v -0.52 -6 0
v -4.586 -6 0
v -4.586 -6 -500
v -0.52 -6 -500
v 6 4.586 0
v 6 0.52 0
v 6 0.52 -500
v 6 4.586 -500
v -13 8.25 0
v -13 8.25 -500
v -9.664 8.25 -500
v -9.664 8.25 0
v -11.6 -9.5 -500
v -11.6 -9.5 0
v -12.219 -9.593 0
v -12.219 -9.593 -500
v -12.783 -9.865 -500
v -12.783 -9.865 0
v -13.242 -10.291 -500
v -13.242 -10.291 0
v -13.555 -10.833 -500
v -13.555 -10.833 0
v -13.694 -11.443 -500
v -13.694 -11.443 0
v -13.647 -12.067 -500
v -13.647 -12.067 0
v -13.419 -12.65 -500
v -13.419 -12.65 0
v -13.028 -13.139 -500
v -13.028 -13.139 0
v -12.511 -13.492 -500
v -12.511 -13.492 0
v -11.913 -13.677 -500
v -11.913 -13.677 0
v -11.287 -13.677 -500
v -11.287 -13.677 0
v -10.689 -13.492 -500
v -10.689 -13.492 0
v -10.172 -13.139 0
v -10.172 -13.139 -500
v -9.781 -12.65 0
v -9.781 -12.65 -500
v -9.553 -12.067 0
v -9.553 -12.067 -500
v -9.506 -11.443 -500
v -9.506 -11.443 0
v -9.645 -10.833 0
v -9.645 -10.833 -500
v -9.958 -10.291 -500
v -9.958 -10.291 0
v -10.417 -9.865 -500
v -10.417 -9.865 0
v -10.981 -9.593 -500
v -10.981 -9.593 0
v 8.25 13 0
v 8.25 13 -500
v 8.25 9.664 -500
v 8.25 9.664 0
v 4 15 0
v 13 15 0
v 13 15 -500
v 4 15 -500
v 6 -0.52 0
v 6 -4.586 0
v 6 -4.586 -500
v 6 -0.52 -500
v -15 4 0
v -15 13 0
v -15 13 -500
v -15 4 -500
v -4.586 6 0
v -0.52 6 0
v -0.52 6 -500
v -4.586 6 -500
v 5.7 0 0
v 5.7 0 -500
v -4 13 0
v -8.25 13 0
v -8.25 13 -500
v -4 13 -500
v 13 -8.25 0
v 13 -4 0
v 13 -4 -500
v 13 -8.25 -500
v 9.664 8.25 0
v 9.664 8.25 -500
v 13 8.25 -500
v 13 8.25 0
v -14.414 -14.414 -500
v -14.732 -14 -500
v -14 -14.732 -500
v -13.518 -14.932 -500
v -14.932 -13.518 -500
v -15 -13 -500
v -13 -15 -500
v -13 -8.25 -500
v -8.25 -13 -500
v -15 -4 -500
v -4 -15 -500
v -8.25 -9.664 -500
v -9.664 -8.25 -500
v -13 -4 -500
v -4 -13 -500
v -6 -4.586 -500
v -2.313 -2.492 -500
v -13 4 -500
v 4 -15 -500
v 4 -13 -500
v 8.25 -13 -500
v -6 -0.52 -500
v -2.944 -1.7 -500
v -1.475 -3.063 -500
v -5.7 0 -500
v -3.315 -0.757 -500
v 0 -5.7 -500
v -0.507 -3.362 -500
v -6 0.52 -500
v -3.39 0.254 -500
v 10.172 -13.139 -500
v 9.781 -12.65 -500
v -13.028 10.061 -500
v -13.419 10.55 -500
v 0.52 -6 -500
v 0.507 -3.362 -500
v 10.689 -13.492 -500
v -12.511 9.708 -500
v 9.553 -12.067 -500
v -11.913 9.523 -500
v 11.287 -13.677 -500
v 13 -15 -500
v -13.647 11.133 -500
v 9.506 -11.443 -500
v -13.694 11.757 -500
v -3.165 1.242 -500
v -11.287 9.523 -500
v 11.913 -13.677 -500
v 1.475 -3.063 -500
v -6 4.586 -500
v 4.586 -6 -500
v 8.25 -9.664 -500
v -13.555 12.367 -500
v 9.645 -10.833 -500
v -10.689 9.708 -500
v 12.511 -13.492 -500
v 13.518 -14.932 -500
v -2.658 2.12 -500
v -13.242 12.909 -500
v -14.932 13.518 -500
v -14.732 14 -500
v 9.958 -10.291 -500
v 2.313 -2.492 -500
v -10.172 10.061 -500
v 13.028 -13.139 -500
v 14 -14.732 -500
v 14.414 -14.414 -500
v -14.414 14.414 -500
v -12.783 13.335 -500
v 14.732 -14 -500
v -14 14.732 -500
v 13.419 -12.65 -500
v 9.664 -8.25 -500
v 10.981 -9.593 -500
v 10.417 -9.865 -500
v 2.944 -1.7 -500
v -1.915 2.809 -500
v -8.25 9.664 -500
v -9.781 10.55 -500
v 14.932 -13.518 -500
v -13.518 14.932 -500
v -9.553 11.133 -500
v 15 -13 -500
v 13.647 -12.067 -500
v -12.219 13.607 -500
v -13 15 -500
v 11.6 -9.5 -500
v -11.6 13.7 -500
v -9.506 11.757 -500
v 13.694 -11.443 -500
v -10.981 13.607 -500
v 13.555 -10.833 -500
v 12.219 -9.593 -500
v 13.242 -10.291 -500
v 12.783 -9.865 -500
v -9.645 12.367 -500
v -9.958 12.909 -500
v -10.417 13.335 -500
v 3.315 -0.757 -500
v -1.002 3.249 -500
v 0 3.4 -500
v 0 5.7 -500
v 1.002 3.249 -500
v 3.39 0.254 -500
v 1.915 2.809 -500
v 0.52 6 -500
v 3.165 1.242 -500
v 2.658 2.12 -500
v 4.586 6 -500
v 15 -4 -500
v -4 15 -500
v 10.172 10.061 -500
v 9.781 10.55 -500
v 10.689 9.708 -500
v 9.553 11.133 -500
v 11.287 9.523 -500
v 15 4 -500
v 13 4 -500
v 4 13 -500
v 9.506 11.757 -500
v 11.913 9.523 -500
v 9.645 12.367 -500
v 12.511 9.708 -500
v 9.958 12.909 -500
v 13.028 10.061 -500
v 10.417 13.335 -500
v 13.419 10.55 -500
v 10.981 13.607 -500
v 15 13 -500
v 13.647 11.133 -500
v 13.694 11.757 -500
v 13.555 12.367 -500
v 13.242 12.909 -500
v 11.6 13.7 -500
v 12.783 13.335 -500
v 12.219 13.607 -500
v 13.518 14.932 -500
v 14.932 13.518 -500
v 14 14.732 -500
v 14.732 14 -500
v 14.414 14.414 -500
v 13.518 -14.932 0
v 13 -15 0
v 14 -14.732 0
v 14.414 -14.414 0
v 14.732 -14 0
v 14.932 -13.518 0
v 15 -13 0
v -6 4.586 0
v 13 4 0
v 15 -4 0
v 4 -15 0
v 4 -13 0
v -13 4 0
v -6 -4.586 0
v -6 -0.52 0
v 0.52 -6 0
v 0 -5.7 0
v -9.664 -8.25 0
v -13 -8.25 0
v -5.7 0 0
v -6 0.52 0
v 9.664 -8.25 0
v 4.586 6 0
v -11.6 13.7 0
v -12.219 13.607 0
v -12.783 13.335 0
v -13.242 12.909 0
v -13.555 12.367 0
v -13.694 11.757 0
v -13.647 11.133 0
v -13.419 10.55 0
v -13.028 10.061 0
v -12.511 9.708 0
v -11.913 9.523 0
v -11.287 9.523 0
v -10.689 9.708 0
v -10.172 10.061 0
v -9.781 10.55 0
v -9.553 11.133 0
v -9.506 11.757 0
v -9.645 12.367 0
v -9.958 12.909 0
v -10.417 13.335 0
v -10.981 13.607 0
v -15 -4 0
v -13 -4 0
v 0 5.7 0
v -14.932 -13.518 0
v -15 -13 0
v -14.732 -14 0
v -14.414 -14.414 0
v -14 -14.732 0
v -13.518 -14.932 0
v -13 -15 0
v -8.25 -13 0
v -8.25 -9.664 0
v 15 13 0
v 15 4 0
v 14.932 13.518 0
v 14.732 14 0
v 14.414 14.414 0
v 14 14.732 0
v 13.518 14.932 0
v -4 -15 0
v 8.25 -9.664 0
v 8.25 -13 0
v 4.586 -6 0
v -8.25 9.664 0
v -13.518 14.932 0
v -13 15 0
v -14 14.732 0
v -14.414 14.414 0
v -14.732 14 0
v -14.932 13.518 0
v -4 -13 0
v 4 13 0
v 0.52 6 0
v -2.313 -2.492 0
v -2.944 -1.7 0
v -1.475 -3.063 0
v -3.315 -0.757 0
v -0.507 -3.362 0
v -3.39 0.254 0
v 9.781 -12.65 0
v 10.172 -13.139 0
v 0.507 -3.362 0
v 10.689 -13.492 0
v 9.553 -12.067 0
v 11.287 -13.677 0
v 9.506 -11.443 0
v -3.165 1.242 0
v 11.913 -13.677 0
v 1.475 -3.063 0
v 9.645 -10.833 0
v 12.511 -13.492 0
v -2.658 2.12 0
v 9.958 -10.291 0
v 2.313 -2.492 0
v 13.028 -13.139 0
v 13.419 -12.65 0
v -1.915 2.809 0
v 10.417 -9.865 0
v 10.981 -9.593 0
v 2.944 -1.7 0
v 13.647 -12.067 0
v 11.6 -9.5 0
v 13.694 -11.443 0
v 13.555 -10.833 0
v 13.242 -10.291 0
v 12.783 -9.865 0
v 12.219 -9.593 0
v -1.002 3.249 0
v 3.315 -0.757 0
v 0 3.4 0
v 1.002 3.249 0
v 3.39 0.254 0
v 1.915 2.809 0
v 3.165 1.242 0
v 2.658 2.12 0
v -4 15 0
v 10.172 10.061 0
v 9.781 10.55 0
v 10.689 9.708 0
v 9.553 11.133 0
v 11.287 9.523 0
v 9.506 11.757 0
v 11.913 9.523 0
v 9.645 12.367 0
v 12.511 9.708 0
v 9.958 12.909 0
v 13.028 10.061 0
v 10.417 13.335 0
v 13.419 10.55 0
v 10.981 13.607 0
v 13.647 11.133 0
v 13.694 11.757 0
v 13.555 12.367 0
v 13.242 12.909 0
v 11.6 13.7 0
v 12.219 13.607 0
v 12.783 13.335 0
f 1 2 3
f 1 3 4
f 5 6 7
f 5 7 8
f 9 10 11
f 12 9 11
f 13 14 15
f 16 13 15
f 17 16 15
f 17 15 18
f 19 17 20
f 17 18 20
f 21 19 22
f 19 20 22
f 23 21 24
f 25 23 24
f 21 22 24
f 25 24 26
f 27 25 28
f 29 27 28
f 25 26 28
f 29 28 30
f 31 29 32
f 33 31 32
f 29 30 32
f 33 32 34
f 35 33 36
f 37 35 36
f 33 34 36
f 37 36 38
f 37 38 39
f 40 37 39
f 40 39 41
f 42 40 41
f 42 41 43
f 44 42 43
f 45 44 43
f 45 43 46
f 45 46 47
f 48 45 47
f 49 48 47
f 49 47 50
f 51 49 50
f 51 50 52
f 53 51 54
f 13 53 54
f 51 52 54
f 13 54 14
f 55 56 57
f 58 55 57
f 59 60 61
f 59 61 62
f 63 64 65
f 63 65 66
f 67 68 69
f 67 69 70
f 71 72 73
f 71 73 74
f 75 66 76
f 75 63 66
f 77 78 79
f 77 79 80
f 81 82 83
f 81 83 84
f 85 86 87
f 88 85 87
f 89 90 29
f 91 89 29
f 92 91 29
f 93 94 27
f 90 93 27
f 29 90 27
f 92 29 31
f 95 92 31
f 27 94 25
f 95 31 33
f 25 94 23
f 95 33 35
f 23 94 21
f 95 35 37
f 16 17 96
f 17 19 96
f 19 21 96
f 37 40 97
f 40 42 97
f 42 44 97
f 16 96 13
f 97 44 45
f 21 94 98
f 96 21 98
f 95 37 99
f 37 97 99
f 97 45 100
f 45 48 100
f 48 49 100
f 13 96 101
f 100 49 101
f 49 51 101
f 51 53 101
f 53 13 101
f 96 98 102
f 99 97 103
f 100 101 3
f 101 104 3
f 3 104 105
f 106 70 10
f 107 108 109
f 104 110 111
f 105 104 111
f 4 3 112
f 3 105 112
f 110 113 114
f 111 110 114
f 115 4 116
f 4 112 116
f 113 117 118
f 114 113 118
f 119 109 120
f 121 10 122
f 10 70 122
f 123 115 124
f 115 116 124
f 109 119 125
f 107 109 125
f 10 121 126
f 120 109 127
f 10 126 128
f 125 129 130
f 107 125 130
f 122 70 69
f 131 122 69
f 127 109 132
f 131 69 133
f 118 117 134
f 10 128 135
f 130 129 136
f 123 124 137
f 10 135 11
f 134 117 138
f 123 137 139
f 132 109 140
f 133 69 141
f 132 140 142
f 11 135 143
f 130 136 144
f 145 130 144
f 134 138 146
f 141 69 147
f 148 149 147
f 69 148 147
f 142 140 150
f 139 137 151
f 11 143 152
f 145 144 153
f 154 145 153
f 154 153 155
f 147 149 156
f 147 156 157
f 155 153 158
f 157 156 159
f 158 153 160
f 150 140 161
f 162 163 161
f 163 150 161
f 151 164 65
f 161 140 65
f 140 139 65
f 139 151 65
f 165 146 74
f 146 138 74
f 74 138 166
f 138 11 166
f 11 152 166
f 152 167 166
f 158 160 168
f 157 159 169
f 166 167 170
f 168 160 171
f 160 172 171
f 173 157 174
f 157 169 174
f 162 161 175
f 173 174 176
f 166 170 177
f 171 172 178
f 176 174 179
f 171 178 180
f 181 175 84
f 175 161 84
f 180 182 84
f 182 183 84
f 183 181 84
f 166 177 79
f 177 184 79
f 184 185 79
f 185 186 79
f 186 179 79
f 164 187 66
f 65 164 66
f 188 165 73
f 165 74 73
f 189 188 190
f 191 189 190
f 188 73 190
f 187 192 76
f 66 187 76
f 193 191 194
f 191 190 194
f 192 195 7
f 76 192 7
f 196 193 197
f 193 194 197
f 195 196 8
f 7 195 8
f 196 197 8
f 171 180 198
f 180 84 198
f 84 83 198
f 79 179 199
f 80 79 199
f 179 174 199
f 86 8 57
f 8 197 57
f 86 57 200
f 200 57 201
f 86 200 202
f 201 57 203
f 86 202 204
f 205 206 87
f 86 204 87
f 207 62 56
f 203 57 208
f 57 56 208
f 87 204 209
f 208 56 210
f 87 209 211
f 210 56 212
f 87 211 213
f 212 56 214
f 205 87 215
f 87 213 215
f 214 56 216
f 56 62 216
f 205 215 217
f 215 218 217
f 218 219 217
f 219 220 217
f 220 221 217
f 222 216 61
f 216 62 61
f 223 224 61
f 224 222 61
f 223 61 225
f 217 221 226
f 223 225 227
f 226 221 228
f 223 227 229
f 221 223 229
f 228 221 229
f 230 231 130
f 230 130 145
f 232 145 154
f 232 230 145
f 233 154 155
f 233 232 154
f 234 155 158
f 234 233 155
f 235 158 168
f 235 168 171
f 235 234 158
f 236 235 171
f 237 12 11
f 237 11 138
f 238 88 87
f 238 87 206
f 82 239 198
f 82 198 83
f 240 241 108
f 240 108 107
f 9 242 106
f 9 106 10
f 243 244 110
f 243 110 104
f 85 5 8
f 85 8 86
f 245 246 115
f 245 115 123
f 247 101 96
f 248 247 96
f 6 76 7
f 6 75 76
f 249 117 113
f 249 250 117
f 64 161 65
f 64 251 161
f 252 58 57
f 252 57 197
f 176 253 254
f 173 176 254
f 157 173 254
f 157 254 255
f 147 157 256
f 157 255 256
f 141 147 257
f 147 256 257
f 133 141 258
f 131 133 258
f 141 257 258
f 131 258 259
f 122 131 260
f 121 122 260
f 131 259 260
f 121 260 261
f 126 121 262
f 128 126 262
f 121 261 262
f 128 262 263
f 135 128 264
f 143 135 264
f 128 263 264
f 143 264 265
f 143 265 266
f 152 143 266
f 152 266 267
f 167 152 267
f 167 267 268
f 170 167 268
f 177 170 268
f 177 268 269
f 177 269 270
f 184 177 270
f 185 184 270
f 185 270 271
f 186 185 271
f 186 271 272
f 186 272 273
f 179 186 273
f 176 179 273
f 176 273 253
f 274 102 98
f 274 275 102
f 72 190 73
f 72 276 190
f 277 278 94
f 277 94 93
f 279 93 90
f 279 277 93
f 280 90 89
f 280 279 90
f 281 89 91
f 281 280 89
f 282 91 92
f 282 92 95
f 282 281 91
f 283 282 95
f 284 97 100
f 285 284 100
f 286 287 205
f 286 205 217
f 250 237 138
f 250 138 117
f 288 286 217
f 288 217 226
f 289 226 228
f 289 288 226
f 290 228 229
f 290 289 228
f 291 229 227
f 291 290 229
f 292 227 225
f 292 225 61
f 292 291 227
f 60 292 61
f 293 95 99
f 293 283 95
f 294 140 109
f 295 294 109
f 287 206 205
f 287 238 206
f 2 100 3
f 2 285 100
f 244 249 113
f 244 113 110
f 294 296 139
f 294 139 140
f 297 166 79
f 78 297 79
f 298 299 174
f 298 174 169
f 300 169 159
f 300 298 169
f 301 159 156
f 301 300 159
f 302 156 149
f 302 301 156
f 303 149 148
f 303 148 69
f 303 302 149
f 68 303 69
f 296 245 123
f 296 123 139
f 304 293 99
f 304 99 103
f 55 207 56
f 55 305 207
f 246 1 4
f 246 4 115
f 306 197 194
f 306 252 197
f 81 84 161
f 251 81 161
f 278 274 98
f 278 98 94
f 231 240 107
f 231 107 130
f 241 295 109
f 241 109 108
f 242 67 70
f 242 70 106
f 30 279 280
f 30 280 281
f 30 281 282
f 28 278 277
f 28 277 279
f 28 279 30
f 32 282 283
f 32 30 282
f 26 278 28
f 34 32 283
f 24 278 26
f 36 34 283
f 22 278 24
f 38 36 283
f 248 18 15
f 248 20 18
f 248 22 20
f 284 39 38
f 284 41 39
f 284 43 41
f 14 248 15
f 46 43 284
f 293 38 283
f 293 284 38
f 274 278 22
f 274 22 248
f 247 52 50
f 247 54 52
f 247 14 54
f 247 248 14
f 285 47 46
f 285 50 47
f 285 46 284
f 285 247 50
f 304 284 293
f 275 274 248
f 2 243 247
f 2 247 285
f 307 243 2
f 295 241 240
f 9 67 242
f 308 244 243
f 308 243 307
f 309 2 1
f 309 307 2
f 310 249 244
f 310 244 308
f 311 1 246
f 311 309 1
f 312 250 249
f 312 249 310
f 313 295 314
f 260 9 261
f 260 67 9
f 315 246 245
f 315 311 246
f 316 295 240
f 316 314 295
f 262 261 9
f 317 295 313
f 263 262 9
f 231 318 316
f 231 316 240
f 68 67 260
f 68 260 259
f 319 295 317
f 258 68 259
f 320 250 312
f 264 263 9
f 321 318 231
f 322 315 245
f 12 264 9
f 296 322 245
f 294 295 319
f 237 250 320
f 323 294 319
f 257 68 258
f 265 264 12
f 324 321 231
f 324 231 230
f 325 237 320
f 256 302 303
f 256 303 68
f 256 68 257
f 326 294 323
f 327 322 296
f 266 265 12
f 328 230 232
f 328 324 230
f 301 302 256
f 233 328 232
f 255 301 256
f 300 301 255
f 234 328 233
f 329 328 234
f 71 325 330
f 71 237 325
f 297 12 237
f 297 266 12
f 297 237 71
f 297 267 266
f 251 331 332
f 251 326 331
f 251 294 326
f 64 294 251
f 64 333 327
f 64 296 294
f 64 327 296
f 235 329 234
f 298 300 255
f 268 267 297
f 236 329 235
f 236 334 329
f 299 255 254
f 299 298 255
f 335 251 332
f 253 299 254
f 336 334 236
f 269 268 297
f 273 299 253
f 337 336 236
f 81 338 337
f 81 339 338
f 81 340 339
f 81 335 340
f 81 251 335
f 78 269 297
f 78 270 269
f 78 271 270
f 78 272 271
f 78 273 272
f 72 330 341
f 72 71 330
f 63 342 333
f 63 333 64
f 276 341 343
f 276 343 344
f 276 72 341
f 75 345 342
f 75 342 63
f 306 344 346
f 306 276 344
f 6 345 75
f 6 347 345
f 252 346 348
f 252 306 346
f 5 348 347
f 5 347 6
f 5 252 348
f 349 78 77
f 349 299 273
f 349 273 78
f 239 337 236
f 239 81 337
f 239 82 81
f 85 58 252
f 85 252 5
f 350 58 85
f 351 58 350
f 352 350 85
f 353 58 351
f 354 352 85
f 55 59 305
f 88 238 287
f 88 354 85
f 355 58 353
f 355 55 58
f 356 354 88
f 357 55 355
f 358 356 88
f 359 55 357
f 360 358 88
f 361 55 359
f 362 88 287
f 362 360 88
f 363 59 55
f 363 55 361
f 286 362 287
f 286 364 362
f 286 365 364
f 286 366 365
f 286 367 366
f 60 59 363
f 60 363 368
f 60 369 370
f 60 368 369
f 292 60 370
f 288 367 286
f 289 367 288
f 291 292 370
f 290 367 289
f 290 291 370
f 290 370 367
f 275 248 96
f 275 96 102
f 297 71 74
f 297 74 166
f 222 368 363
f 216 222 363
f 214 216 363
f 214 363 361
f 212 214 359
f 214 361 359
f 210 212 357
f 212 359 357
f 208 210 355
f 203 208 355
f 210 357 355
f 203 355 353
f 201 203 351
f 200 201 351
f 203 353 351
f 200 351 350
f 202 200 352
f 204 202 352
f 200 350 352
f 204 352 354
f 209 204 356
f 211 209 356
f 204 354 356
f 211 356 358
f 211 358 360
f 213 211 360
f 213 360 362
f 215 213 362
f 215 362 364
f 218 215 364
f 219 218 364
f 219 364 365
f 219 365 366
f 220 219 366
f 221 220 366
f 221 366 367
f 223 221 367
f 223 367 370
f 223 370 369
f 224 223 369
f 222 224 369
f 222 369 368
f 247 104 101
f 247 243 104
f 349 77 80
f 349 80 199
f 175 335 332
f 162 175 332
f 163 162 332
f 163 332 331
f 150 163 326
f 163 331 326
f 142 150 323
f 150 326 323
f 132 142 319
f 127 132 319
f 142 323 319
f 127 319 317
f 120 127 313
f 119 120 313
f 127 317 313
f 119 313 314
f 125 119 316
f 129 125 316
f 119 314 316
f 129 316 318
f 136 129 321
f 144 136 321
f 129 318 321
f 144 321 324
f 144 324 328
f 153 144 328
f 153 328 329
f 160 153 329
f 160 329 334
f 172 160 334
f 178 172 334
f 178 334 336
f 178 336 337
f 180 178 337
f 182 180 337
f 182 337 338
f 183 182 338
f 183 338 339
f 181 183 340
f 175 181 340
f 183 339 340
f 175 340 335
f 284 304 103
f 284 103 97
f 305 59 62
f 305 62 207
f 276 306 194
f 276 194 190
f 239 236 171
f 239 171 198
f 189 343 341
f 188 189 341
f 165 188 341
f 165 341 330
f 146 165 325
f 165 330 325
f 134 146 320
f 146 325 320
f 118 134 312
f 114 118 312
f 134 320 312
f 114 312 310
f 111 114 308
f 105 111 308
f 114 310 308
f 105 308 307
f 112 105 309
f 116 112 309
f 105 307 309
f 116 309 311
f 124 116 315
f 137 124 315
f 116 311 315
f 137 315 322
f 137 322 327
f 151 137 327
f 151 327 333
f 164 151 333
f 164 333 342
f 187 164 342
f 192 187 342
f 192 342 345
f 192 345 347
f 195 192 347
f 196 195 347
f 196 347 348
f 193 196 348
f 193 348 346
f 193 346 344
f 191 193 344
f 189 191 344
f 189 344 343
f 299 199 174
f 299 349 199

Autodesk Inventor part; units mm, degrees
sketch "Sketch_1" plane through (0, 0, 0) normal (0, 0, 1) x (1, 0, 0)
  line L0 (-15, 4) -> (-13, 4)
  line L1 (-13, 4) -> (-13, 8.25)
  line L2 (-13, 8.25) -> (-9.6642, 8.25)
  line L3 (-9.6642, 8.25) -> (-6, 4.5858)
  line L4 (-6, 4.5858) -> (-6, 0.5196)
  line L5 (-6, 0.5196) -> (-5.7, 0)
  line L6 (-5.7, 0) -> (-6, -0.5196)
  line L7 (-6, -0.5196) -> (-6, -4.5858)
  line L8 (-6, -4.5858) -> (-9.6642, -8.25)
  line L9 (-9.6642, -8.25) -> (-13, -8.25)
  line L10 (-13, -8.25) -> (-13, -4)
  line L11 (-13, -4) -> (-15, -4)
  line L12 (-15, -4) -> (-15, -13)
  arc A0 (-15, -13) -> (-13, -15) centre (-13, -13) ccw
  line L13 (-13, -15) -> (-4, -15)
  line L14 (-4, -15) -> (-4, -13)
  line L15 (-4, -13) -> (-8.25, -13)
  line L16 (-8.25, -13) -> (-8.25, -9.6642)
  line L17 (-8.25, -9.6642) -> (-4.5858, -6)
  line L18 (-4.5858, -6) -> (-0.5196, -6)
  line L19 (-0.5196, -6) -> (0, -5.7)
  line L20 (0, -5.7) -> (0.5196, -6)
  line L21 (0.5196, -6) -> (4.5858, -6)
  line L22 (4.5858, -6) -> (8.25, -9.6642)
  line L23 (8.25, -9.6642) -> (8.25, -13)
  line L24 (8.25, -13) -> (4, -13)
  line L25 (4, -13) -> (4, -15)
  line L26 (4, -15) -> (13, -15)
  arc A1 (13, -15) -> (15, -13) centre (13, -13) ccw
  line L27 (15, -13) -> (15, -4)
  line L28 (15, -4) -> (13, -4)
  line L29 (13, -4) -> (13, -8.25)
  line L30 (13, -8.25) -> (9.6642, -8.25)
  line L31 (9.6642, -8.25) -> (6, -4.5858)
  line L32 (6, -4.5858) -> (6, -0.5196)
  line L33 (6, -0.5196) -> (5.7, 0)
  line L34 (5.7, 0) -> (6, 0.5196)
  line L35 (6, 0.5196) -> (6, 4.5858)
  line L36 (6, 4.5858) -> (9.6642, 8.25)
  line L37 (9.6642, 8.25) -> (13, 8.25)
  line L38 (13, 8.25) -> (13, 4)
  line L39 (13, 4) -> (15, 4)
  line L40 (15, 4) -> (15, 13)
  arc A2 (15, 13) -> (13, 15) centre (13, 13) ccw
  line L41 (13, 15) -> (4, 15)
  line L42 (4, 15) -> (4, 13)
  line L43 (4, 13) -> (8.25, 13)
  line L44 (8.25, 13) -> (8.25, 9.6642)
  line L45 (8.25, 9.6642) -> (4.5858, 6)
  line L46 (4.5858, 6) -> (0.5196, 6)
  line L47 (0.5196, 6) -> (0, 5.7)
  line L48 (0, 5.7) -> (-0.5196, 6)
  line L49 (-0.5196, 6) -> (-4.5858, 6)
  line L50 (-4.5858, 6) -> (-8.25, 9.6642)
  line L51 (-8.25, 9.6642) -> (-8.25, 13)
  line L52 (-8.25, 13) -> (-4, 13)
  line L53 (-4, 13) -> (-4, 15)
  line L54 (-4, 15) -> (-13, 15)
  arc A3 (-13, 15) -> (-15, 13) centre (-13, 13) ccw
  line L55 (-15, 13) -> (-15, 4)
extrude "Extrusion1" add sketch "Sketch_1" against normal blind 500
sketch "Sketch2" plane through (0, 0, -500) normal (0, 0, -1) x (-1, 0, 0)
  point P0 (0, 0)
hole "Hole1" at (0, 0, -500) direction (0, 0, 1) diameter 6.8 depth 500
sketch "Sketch3" plane through (0, 0, -500) normal (0, 0, -1) x (-1, 0, 0)
  point P0 (-11.6, 11.6)
hole "Hole2" at (11.6, 11.6, -500) direction (0, 0, 1) diameter 4.2 depth 500
pattern_linear "Rectangular Pattern1" count 2 spacing 23.2 along (-1, 0, 0) count 2 spacing 23.2 along (0, -1, 0) of "Hole2"
ref_plane "C1_XY" through (0, 0, 0) normal (0, 0, 1) x (1, 0, 0)
ref_plane "C1_YZ" through (0, 0, 0) normal (1, 0, 0) x (0, 1, 0)
ref_plane "C1_ZX" through (0, 0, 0) normal (0, 1, 0) x (0, 0, 1)
ref_plane "to_frame_cap1_XY" through (0, 0, 0) normal (0, 0, 1) x (1, 0, 0)
ref_plane "to_frame_cap1_YZ" through (0, 0, 0) normal (1, 0, 0) x (0, 1, 0)
ref_plane "to_frame_cap1_ZX" through (0, 0, 0) normal (0, 1, 0) x (0, 0, 1)
ref_plane "to_frame_cap2_XY" through (0, 0, -500) normal (0, 0, -1) x (1, 0, 0)
ref_plane "to_frame_cap2_YZ" through (0, 0, -500) normal (1, 0, 0) x (0, -1, 0)
ref_plane "to_frame_cap2_ZX" through (0, 0, -500) normal (0, -1, 0) x (0, 0, -1)
properties part number "HFS6-3030-500"
